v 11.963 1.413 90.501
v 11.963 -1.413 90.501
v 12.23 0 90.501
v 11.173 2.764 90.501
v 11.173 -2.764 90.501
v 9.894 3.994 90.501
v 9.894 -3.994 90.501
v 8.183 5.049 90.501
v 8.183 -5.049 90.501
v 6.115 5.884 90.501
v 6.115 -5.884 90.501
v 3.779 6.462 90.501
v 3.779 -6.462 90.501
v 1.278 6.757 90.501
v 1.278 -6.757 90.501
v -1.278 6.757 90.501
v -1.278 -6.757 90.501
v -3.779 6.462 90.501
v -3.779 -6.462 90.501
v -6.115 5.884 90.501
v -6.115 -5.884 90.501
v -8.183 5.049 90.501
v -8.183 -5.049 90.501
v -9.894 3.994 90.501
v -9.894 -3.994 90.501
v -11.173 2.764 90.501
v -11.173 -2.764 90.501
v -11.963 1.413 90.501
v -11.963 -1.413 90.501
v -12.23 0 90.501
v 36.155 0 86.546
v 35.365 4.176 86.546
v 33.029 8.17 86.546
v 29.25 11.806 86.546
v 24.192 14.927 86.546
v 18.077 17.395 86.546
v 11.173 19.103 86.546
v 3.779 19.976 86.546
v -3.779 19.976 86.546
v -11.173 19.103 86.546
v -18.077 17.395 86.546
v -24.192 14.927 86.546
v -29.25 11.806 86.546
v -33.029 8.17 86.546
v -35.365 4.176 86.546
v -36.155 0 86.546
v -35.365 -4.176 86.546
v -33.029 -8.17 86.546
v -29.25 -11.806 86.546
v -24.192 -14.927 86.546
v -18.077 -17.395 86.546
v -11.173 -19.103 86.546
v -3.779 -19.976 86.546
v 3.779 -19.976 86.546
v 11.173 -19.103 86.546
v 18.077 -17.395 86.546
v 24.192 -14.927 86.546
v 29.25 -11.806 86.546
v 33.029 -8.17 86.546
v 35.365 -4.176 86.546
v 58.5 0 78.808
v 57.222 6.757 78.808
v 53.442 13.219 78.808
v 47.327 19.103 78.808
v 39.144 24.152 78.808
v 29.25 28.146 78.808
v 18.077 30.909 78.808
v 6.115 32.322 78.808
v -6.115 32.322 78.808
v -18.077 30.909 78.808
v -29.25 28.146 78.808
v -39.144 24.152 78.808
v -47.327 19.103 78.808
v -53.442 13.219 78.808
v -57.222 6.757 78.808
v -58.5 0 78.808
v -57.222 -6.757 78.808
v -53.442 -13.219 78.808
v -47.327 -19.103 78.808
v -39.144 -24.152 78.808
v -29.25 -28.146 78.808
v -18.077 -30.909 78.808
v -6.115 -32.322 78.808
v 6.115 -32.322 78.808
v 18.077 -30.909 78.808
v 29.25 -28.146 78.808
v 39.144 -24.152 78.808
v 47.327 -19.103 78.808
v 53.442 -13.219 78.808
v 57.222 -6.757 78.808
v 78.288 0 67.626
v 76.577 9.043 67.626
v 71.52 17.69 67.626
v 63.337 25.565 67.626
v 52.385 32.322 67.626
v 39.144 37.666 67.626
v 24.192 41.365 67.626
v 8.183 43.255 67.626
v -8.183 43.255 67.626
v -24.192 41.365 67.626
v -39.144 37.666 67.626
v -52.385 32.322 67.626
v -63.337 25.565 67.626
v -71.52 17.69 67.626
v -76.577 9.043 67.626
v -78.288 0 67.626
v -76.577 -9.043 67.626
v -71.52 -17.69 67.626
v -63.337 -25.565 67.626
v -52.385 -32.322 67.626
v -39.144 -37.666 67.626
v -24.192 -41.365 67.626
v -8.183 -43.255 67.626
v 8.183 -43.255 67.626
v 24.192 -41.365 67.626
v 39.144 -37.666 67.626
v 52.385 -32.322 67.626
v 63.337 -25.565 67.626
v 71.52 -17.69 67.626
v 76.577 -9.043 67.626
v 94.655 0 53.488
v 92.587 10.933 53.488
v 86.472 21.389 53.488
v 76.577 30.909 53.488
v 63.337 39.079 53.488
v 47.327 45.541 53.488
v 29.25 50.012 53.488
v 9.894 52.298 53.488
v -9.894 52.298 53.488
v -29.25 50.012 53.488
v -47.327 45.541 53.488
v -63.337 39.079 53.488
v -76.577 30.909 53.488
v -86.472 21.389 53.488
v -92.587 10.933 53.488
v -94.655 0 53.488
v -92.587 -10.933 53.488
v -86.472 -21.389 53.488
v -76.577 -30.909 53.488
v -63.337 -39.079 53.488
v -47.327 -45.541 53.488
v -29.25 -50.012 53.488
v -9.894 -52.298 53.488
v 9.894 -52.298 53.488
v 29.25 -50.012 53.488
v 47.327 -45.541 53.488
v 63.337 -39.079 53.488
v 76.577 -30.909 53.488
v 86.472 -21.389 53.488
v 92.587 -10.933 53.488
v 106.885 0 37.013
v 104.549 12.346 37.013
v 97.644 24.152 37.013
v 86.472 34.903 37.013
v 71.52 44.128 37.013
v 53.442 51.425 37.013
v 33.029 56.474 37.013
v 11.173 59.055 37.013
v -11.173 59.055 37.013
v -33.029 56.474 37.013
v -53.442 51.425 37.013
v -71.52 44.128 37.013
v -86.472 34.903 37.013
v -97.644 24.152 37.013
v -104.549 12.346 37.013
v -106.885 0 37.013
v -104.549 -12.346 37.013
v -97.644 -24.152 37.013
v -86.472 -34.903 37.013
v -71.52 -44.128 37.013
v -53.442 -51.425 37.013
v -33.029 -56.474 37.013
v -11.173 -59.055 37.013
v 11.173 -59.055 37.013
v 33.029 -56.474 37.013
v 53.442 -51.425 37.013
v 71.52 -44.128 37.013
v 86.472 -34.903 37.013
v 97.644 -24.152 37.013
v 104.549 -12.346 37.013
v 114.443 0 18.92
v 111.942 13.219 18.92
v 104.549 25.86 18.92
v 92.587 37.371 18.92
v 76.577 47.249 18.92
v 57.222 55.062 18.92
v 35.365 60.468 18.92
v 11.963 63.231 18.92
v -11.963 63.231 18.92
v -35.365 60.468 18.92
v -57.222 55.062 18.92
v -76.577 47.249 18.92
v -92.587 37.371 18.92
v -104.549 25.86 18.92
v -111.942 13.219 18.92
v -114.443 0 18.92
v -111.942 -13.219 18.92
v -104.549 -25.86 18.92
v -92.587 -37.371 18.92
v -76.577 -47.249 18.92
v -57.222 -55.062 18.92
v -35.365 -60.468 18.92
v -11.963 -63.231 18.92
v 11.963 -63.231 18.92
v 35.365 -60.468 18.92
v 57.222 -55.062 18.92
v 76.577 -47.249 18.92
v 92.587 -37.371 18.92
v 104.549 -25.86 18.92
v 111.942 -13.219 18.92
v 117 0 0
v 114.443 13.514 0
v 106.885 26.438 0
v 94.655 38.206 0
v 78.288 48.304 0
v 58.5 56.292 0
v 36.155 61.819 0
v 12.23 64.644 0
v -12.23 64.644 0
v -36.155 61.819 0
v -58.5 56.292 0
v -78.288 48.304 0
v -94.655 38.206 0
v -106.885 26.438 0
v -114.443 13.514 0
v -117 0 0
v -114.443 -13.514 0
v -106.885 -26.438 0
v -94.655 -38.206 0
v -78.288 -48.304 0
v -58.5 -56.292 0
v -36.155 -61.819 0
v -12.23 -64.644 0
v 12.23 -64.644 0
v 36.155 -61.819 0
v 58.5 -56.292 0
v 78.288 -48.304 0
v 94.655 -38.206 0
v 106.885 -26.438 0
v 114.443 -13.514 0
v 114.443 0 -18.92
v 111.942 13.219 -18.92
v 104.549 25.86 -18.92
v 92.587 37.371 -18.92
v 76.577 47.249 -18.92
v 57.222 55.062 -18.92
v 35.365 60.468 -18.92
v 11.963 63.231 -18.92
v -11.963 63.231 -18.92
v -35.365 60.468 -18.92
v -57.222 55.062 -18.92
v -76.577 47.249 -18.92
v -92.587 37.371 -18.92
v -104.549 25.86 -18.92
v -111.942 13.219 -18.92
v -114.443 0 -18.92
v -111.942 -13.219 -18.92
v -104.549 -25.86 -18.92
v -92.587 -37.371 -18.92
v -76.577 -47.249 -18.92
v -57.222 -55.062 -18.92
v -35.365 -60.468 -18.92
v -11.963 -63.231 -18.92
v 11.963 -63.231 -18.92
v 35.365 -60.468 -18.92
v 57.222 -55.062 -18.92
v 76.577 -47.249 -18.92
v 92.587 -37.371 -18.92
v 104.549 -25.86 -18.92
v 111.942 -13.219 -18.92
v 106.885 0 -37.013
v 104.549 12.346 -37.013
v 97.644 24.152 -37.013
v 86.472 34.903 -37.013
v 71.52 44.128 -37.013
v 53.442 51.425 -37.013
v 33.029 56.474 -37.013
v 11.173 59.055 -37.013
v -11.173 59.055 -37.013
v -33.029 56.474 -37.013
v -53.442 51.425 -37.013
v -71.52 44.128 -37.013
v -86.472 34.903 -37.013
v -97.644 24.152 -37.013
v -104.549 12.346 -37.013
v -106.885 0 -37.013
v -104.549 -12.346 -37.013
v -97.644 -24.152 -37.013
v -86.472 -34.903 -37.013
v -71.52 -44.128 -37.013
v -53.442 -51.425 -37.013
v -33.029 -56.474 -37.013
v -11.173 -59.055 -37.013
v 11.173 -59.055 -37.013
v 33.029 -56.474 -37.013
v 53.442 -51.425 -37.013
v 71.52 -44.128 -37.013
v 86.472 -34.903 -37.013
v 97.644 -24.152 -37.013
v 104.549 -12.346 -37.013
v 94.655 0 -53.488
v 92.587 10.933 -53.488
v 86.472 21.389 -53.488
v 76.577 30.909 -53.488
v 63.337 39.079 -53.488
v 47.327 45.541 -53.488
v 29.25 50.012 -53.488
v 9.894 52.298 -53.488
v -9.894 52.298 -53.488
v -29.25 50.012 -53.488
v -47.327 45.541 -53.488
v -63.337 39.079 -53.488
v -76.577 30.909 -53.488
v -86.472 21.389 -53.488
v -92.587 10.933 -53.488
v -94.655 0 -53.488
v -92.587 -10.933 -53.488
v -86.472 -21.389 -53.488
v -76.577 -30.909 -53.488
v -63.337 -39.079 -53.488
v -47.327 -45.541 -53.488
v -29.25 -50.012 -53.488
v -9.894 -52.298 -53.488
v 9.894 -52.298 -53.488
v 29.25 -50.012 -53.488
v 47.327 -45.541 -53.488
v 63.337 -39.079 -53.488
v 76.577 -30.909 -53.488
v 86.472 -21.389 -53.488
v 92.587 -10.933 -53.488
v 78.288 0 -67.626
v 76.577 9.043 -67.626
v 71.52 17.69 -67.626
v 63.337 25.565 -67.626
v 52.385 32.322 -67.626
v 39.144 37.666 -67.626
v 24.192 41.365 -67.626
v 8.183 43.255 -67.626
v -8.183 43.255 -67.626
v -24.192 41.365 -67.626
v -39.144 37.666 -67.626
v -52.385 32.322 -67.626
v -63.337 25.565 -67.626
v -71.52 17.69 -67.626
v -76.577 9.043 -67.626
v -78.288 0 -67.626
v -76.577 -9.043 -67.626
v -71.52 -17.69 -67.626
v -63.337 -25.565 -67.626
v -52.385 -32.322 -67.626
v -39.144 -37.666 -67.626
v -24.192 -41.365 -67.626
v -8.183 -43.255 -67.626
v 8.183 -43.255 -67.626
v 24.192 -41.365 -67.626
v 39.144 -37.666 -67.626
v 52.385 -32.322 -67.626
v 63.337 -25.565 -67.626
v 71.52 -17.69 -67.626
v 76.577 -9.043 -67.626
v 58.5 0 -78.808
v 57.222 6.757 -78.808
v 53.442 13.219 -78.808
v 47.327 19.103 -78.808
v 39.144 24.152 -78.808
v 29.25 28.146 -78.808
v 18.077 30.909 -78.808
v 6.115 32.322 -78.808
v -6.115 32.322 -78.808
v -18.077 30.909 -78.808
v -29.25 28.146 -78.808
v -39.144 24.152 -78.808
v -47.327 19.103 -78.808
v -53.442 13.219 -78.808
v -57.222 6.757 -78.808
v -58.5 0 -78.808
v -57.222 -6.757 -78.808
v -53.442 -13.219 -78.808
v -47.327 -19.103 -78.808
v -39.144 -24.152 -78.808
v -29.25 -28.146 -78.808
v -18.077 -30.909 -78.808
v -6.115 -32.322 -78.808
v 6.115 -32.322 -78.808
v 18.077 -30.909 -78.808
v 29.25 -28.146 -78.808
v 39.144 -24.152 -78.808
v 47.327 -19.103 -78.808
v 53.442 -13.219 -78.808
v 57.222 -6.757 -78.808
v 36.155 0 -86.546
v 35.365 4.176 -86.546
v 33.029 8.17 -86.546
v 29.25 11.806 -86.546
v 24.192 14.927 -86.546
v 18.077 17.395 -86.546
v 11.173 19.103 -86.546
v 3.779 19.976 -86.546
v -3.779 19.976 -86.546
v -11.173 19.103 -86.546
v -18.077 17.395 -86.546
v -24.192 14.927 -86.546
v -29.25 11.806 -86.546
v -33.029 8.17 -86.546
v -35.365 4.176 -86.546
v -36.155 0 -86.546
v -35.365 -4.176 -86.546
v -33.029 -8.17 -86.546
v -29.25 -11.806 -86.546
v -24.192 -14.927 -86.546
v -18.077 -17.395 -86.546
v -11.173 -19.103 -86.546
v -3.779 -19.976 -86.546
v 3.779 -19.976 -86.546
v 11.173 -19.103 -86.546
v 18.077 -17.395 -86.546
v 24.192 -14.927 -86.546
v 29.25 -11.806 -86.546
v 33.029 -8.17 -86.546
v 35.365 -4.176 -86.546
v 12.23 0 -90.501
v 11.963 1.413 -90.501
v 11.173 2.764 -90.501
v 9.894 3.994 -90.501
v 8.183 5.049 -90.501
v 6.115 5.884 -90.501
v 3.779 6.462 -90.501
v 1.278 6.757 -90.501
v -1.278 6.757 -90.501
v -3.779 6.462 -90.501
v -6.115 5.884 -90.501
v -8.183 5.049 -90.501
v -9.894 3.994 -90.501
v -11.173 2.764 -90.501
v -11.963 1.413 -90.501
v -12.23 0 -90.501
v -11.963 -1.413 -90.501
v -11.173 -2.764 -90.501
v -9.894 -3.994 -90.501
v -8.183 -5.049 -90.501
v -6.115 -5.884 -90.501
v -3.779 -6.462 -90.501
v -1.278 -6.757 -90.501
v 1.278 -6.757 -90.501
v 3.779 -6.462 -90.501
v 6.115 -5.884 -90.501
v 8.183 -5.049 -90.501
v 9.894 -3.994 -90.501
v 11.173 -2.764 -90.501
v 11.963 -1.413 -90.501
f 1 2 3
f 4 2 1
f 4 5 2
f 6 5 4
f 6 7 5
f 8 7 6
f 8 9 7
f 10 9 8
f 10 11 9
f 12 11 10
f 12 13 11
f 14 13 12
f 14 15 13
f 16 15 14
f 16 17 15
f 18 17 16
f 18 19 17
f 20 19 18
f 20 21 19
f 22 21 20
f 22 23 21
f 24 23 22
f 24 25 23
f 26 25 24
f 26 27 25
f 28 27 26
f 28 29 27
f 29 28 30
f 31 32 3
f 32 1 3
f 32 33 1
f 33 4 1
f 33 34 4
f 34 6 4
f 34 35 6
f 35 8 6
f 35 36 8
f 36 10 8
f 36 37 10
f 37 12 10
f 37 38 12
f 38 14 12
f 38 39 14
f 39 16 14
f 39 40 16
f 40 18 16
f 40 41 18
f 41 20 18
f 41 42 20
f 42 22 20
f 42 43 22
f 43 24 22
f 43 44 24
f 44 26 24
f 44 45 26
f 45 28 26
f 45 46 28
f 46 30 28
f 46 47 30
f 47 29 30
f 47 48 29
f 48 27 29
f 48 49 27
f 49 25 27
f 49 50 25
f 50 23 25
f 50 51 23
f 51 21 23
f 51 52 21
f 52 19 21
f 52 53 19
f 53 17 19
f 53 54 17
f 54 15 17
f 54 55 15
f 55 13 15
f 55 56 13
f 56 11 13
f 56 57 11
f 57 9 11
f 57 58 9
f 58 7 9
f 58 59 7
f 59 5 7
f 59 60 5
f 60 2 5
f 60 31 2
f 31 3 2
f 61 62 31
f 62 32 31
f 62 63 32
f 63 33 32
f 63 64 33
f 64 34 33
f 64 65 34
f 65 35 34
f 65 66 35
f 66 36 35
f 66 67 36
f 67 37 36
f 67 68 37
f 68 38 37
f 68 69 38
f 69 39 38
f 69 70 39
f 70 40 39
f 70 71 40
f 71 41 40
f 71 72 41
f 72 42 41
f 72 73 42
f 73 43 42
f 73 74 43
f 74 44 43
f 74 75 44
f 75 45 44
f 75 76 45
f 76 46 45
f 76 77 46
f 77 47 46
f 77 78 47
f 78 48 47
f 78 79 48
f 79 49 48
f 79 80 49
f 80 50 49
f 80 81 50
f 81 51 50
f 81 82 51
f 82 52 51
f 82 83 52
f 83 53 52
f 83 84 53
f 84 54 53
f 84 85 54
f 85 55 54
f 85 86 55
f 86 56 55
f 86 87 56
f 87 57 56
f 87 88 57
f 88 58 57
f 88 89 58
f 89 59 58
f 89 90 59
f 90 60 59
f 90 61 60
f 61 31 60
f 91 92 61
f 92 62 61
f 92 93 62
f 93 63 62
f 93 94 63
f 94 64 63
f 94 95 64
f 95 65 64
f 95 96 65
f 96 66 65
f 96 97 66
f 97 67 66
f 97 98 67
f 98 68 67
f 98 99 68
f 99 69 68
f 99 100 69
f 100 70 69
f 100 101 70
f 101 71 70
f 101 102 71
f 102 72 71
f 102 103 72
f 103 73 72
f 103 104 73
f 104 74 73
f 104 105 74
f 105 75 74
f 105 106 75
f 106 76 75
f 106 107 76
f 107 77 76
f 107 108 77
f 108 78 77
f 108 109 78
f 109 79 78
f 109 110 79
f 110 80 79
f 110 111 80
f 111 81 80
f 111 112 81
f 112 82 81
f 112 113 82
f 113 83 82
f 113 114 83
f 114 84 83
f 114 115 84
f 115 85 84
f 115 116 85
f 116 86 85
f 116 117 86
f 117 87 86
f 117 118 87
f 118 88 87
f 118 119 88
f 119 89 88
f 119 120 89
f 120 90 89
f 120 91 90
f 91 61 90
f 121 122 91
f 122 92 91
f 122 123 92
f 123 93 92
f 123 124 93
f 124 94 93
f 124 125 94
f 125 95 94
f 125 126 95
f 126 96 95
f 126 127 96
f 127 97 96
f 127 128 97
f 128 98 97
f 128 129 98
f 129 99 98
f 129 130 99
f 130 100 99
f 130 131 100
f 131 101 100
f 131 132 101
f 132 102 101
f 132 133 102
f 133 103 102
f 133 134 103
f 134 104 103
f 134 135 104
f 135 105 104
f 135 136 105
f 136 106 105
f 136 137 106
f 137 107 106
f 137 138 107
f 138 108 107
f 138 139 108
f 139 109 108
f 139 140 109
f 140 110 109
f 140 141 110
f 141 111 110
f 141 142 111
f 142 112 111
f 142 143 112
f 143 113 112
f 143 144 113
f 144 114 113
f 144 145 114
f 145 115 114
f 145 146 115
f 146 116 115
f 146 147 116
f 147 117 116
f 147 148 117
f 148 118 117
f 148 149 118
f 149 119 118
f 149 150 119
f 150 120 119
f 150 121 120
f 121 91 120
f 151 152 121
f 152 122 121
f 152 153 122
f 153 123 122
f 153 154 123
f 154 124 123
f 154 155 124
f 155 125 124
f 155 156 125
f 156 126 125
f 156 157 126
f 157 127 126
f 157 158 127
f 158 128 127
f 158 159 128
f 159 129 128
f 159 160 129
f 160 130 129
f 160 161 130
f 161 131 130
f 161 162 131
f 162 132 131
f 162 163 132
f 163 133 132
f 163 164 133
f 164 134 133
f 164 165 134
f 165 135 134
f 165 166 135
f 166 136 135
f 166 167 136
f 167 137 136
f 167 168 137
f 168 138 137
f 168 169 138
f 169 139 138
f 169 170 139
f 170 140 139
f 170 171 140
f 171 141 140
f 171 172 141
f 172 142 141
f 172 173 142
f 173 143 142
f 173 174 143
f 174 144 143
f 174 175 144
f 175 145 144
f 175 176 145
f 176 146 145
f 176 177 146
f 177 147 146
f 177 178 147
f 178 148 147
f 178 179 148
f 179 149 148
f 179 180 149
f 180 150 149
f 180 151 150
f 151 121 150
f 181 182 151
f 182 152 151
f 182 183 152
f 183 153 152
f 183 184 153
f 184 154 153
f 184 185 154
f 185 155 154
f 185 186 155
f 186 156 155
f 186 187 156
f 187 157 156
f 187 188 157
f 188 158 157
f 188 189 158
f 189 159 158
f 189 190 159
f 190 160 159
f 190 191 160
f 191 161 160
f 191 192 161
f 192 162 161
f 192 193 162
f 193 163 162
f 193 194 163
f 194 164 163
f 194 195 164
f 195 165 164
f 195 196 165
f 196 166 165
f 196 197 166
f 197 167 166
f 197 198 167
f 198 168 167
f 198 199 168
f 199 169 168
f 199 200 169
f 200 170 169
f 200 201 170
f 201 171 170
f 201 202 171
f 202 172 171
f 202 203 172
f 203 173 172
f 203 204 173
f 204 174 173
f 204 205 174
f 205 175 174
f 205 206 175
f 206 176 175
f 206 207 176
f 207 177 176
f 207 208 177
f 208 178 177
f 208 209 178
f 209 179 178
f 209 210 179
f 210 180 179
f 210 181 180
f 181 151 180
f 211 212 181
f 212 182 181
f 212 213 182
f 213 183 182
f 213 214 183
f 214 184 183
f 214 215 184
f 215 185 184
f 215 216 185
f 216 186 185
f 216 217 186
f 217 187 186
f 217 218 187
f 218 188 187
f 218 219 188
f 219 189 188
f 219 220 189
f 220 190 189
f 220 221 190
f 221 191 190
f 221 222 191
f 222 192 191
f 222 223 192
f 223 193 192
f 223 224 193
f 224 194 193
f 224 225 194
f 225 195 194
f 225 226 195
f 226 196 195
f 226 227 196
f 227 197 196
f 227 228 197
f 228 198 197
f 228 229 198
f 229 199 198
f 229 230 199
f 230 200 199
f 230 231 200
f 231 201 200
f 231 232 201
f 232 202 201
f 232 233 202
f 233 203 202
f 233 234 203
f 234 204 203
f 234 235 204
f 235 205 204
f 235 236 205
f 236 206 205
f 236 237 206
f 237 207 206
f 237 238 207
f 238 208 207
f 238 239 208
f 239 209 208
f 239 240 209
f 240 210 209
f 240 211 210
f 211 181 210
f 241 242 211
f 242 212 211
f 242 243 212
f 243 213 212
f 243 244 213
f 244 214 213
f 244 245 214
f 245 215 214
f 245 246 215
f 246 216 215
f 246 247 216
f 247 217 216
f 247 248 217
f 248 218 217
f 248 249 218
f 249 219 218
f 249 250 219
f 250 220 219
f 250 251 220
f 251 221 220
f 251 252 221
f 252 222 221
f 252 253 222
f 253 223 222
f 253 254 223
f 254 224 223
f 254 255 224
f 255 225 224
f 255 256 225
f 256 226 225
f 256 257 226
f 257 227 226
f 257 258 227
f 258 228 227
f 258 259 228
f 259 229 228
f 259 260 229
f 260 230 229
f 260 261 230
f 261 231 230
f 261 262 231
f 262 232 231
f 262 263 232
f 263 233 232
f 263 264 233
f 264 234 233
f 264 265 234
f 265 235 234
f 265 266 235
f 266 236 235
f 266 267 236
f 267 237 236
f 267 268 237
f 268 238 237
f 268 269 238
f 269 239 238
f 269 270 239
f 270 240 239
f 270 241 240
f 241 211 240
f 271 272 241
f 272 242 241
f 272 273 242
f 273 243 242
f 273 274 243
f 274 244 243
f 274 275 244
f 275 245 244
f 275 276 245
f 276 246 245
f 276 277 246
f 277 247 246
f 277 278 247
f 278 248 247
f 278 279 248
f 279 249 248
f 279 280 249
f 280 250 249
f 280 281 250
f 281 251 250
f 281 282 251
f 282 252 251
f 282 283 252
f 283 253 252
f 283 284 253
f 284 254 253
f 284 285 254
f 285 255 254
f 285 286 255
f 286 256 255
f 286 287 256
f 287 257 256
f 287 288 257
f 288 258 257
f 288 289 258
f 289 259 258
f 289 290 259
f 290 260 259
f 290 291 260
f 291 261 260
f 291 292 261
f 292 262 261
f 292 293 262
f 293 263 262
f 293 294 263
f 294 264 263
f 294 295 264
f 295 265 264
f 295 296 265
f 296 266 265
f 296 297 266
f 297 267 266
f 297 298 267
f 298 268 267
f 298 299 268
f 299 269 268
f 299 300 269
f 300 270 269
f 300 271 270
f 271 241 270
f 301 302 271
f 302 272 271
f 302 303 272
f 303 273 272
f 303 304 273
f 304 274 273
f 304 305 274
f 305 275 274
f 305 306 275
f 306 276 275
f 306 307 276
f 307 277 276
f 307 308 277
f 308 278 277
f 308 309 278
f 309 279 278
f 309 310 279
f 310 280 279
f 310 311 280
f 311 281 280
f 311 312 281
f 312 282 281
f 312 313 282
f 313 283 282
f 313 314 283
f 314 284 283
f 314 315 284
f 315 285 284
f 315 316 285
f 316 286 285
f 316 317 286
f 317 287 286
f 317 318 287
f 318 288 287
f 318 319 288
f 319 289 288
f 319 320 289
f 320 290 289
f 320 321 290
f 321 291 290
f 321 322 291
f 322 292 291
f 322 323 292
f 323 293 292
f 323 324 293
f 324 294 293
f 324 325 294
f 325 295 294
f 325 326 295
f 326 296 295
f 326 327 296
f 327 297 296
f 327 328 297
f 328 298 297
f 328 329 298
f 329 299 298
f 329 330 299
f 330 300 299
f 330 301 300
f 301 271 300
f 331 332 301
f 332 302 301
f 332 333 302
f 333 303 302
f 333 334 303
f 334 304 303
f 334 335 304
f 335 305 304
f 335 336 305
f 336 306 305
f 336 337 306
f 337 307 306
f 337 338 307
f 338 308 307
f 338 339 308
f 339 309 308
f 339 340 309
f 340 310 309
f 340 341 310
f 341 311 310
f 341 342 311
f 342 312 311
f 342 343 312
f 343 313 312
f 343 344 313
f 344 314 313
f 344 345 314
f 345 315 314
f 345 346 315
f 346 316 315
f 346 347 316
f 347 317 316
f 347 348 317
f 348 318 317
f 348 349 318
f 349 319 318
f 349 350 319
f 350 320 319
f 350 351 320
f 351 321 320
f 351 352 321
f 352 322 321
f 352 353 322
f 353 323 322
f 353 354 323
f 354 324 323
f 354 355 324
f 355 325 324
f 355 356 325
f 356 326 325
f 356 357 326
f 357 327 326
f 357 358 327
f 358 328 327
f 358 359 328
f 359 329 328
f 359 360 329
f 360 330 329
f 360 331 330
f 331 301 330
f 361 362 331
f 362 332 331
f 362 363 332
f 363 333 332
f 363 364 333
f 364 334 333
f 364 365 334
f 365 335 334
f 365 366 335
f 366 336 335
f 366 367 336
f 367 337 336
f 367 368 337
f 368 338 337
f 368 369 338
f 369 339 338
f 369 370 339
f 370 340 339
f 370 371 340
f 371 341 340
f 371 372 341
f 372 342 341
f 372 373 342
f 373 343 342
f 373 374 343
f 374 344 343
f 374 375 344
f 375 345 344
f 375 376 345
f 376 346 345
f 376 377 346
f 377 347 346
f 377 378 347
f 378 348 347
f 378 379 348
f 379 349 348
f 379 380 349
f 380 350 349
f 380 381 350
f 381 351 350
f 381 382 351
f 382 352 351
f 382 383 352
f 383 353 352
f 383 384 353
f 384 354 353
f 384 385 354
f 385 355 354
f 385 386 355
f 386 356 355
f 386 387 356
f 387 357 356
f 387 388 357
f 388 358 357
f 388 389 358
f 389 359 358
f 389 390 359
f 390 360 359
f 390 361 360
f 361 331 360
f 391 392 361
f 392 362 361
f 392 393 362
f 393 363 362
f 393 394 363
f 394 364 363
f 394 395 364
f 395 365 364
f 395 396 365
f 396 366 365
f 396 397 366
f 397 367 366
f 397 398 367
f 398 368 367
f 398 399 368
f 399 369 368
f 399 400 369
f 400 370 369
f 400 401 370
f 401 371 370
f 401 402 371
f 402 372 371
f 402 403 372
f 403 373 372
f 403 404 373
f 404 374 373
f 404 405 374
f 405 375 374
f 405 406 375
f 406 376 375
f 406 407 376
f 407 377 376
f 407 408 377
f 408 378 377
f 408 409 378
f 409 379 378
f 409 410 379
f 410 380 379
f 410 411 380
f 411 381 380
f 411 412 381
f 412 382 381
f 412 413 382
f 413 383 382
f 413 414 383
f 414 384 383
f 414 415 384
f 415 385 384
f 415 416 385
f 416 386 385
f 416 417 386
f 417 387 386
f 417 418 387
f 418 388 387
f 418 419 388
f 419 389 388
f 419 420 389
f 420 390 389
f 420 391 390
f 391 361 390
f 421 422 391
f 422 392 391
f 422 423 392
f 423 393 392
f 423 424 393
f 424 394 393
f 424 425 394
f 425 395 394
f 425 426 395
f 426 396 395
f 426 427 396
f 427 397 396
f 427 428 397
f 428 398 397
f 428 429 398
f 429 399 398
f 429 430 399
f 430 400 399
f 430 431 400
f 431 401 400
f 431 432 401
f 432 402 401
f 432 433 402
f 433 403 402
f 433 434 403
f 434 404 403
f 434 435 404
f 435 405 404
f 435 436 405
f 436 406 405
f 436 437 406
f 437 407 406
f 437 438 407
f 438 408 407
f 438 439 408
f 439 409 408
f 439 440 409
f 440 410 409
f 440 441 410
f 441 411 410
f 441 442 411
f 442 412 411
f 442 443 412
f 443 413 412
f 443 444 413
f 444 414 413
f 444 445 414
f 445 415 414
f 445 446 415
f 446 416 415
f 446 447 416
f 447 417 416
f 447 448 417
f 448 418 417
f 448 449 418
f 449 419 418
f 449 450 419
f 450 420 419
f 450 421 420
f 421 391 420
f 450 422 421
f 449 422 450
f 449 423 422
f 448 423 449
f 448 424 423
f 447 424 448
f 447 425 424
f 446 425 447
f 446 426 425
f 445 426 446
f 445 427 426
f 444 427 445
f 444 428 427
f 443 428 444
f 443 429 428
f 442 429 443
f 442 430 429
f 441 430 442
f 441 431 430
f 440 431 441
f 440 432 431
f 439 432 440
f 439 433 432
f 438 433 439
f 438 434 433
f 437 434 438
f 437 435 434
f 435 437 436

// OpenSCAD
// Generated by SolidPython 1.0.1 on 2020-07-29 00:46:48


scale(v = [9, 5, 7]) {
	sphere(r = 13);
}
/***********************************************
*********      SolidPython code:      **********
************************************************
 
# import packages: SolidPython
from solid import *
from solid.utils import *
from itertools import chain, combinations, permutations


class Resize:

    def __init__(self, scad_file):
        self.scad_file = scad_file
        #self.scad_file = import_scad(scad_file)
        # cone/cylinder param:
        self.r1 = 0
        self.r2 = 0
        self.h = 0
        # rectangular prism param:
        self.w = 0
        self.l = 0
        # ellipse param:
        self.r = 0

    # import OpenScad code (file name corresponds to shape)


    # classify shape + parameters
    def assign(self, param1, param2, param3):
        if self.scad_file == 'cone.scad':
            self.r1 = param1
            self.r2 = param2
            self.h = param3
        elif self.scad_file == 'cylinder.scad':
            self.r1 = param1
            self.r2 = param2
            self.h = param3
        elif self.scad_file == 'rectangularPrism.scad':
            self.h = param1
            self.l = param2
            self.w = param3
        else:
            self.r = param1
            self.h = param2

    # resize parameters
    def iterate(self):
        x = range(3, 20, 2)
        i = 1
        if self.scad_file == 'cone.scad':
            tempList = list(permutations(x, 2))
            for temp in tempList:
                param1 = temp[0]
                param2 = temp[1]
                filepath = 'produced_scad_files/' + 'cone' + str(param1) + '_' + str(param2) + '_' + '.scad'
                scad_render_to_file(cylinder(h=param1, r1=param2, r2=0), filepath)

        elif self.scad_file == 'cylinder.scad':
            tempList = list(permutations(x, 3))
            for temp in tempList:
                param1 = temp[0]
                param2 = temp[1]
                filepath = 'produced_scad_files/' + 'cylinder' + str(param1) + '_' + str(param2) + '_' + '.scad'
                scad_render_to_file(cylinder(h=param1, r1=param2, r2=param2), filepath)

        elif self.scad_file == 'rectangularPrism.scad':
            tempList = list(permutations(x, 3))
            for temp in tempList:
                param1 = temp[0]
                param2 = temp[1]
                param3 = temp[2]
                filepath = 'produced_scad_files/' + 'rectangularPrism' + str(param1) + '_' + str(param2) + '_' + str(
                    param3) + '.scad'
                scad_render_to_file(cube(size=(param1, param2, param3)), filepath)

        elif self.scad_file == 'ellipse.scad':
            tempList = list(permutations(x, 4))
            for temp in tempList:
                param1 = temp[0]
                param2 = temp[1]
                param3 = temp[2]
                param4 = temp[3]
                filepath = 'produced_scad_files/' + 'ellipse' + str(param1) + '_' + str(param2) + '_' + str(param3) + '_' + str(param4) + '.scad'
                scad_render_to_file(scale([param1, param2, param3])(sphere(r=param4)), filepath)

    def render_to_scadfile(self):
        scad_render_to_file(scad, 'example.scad') 
 
************************************************/
